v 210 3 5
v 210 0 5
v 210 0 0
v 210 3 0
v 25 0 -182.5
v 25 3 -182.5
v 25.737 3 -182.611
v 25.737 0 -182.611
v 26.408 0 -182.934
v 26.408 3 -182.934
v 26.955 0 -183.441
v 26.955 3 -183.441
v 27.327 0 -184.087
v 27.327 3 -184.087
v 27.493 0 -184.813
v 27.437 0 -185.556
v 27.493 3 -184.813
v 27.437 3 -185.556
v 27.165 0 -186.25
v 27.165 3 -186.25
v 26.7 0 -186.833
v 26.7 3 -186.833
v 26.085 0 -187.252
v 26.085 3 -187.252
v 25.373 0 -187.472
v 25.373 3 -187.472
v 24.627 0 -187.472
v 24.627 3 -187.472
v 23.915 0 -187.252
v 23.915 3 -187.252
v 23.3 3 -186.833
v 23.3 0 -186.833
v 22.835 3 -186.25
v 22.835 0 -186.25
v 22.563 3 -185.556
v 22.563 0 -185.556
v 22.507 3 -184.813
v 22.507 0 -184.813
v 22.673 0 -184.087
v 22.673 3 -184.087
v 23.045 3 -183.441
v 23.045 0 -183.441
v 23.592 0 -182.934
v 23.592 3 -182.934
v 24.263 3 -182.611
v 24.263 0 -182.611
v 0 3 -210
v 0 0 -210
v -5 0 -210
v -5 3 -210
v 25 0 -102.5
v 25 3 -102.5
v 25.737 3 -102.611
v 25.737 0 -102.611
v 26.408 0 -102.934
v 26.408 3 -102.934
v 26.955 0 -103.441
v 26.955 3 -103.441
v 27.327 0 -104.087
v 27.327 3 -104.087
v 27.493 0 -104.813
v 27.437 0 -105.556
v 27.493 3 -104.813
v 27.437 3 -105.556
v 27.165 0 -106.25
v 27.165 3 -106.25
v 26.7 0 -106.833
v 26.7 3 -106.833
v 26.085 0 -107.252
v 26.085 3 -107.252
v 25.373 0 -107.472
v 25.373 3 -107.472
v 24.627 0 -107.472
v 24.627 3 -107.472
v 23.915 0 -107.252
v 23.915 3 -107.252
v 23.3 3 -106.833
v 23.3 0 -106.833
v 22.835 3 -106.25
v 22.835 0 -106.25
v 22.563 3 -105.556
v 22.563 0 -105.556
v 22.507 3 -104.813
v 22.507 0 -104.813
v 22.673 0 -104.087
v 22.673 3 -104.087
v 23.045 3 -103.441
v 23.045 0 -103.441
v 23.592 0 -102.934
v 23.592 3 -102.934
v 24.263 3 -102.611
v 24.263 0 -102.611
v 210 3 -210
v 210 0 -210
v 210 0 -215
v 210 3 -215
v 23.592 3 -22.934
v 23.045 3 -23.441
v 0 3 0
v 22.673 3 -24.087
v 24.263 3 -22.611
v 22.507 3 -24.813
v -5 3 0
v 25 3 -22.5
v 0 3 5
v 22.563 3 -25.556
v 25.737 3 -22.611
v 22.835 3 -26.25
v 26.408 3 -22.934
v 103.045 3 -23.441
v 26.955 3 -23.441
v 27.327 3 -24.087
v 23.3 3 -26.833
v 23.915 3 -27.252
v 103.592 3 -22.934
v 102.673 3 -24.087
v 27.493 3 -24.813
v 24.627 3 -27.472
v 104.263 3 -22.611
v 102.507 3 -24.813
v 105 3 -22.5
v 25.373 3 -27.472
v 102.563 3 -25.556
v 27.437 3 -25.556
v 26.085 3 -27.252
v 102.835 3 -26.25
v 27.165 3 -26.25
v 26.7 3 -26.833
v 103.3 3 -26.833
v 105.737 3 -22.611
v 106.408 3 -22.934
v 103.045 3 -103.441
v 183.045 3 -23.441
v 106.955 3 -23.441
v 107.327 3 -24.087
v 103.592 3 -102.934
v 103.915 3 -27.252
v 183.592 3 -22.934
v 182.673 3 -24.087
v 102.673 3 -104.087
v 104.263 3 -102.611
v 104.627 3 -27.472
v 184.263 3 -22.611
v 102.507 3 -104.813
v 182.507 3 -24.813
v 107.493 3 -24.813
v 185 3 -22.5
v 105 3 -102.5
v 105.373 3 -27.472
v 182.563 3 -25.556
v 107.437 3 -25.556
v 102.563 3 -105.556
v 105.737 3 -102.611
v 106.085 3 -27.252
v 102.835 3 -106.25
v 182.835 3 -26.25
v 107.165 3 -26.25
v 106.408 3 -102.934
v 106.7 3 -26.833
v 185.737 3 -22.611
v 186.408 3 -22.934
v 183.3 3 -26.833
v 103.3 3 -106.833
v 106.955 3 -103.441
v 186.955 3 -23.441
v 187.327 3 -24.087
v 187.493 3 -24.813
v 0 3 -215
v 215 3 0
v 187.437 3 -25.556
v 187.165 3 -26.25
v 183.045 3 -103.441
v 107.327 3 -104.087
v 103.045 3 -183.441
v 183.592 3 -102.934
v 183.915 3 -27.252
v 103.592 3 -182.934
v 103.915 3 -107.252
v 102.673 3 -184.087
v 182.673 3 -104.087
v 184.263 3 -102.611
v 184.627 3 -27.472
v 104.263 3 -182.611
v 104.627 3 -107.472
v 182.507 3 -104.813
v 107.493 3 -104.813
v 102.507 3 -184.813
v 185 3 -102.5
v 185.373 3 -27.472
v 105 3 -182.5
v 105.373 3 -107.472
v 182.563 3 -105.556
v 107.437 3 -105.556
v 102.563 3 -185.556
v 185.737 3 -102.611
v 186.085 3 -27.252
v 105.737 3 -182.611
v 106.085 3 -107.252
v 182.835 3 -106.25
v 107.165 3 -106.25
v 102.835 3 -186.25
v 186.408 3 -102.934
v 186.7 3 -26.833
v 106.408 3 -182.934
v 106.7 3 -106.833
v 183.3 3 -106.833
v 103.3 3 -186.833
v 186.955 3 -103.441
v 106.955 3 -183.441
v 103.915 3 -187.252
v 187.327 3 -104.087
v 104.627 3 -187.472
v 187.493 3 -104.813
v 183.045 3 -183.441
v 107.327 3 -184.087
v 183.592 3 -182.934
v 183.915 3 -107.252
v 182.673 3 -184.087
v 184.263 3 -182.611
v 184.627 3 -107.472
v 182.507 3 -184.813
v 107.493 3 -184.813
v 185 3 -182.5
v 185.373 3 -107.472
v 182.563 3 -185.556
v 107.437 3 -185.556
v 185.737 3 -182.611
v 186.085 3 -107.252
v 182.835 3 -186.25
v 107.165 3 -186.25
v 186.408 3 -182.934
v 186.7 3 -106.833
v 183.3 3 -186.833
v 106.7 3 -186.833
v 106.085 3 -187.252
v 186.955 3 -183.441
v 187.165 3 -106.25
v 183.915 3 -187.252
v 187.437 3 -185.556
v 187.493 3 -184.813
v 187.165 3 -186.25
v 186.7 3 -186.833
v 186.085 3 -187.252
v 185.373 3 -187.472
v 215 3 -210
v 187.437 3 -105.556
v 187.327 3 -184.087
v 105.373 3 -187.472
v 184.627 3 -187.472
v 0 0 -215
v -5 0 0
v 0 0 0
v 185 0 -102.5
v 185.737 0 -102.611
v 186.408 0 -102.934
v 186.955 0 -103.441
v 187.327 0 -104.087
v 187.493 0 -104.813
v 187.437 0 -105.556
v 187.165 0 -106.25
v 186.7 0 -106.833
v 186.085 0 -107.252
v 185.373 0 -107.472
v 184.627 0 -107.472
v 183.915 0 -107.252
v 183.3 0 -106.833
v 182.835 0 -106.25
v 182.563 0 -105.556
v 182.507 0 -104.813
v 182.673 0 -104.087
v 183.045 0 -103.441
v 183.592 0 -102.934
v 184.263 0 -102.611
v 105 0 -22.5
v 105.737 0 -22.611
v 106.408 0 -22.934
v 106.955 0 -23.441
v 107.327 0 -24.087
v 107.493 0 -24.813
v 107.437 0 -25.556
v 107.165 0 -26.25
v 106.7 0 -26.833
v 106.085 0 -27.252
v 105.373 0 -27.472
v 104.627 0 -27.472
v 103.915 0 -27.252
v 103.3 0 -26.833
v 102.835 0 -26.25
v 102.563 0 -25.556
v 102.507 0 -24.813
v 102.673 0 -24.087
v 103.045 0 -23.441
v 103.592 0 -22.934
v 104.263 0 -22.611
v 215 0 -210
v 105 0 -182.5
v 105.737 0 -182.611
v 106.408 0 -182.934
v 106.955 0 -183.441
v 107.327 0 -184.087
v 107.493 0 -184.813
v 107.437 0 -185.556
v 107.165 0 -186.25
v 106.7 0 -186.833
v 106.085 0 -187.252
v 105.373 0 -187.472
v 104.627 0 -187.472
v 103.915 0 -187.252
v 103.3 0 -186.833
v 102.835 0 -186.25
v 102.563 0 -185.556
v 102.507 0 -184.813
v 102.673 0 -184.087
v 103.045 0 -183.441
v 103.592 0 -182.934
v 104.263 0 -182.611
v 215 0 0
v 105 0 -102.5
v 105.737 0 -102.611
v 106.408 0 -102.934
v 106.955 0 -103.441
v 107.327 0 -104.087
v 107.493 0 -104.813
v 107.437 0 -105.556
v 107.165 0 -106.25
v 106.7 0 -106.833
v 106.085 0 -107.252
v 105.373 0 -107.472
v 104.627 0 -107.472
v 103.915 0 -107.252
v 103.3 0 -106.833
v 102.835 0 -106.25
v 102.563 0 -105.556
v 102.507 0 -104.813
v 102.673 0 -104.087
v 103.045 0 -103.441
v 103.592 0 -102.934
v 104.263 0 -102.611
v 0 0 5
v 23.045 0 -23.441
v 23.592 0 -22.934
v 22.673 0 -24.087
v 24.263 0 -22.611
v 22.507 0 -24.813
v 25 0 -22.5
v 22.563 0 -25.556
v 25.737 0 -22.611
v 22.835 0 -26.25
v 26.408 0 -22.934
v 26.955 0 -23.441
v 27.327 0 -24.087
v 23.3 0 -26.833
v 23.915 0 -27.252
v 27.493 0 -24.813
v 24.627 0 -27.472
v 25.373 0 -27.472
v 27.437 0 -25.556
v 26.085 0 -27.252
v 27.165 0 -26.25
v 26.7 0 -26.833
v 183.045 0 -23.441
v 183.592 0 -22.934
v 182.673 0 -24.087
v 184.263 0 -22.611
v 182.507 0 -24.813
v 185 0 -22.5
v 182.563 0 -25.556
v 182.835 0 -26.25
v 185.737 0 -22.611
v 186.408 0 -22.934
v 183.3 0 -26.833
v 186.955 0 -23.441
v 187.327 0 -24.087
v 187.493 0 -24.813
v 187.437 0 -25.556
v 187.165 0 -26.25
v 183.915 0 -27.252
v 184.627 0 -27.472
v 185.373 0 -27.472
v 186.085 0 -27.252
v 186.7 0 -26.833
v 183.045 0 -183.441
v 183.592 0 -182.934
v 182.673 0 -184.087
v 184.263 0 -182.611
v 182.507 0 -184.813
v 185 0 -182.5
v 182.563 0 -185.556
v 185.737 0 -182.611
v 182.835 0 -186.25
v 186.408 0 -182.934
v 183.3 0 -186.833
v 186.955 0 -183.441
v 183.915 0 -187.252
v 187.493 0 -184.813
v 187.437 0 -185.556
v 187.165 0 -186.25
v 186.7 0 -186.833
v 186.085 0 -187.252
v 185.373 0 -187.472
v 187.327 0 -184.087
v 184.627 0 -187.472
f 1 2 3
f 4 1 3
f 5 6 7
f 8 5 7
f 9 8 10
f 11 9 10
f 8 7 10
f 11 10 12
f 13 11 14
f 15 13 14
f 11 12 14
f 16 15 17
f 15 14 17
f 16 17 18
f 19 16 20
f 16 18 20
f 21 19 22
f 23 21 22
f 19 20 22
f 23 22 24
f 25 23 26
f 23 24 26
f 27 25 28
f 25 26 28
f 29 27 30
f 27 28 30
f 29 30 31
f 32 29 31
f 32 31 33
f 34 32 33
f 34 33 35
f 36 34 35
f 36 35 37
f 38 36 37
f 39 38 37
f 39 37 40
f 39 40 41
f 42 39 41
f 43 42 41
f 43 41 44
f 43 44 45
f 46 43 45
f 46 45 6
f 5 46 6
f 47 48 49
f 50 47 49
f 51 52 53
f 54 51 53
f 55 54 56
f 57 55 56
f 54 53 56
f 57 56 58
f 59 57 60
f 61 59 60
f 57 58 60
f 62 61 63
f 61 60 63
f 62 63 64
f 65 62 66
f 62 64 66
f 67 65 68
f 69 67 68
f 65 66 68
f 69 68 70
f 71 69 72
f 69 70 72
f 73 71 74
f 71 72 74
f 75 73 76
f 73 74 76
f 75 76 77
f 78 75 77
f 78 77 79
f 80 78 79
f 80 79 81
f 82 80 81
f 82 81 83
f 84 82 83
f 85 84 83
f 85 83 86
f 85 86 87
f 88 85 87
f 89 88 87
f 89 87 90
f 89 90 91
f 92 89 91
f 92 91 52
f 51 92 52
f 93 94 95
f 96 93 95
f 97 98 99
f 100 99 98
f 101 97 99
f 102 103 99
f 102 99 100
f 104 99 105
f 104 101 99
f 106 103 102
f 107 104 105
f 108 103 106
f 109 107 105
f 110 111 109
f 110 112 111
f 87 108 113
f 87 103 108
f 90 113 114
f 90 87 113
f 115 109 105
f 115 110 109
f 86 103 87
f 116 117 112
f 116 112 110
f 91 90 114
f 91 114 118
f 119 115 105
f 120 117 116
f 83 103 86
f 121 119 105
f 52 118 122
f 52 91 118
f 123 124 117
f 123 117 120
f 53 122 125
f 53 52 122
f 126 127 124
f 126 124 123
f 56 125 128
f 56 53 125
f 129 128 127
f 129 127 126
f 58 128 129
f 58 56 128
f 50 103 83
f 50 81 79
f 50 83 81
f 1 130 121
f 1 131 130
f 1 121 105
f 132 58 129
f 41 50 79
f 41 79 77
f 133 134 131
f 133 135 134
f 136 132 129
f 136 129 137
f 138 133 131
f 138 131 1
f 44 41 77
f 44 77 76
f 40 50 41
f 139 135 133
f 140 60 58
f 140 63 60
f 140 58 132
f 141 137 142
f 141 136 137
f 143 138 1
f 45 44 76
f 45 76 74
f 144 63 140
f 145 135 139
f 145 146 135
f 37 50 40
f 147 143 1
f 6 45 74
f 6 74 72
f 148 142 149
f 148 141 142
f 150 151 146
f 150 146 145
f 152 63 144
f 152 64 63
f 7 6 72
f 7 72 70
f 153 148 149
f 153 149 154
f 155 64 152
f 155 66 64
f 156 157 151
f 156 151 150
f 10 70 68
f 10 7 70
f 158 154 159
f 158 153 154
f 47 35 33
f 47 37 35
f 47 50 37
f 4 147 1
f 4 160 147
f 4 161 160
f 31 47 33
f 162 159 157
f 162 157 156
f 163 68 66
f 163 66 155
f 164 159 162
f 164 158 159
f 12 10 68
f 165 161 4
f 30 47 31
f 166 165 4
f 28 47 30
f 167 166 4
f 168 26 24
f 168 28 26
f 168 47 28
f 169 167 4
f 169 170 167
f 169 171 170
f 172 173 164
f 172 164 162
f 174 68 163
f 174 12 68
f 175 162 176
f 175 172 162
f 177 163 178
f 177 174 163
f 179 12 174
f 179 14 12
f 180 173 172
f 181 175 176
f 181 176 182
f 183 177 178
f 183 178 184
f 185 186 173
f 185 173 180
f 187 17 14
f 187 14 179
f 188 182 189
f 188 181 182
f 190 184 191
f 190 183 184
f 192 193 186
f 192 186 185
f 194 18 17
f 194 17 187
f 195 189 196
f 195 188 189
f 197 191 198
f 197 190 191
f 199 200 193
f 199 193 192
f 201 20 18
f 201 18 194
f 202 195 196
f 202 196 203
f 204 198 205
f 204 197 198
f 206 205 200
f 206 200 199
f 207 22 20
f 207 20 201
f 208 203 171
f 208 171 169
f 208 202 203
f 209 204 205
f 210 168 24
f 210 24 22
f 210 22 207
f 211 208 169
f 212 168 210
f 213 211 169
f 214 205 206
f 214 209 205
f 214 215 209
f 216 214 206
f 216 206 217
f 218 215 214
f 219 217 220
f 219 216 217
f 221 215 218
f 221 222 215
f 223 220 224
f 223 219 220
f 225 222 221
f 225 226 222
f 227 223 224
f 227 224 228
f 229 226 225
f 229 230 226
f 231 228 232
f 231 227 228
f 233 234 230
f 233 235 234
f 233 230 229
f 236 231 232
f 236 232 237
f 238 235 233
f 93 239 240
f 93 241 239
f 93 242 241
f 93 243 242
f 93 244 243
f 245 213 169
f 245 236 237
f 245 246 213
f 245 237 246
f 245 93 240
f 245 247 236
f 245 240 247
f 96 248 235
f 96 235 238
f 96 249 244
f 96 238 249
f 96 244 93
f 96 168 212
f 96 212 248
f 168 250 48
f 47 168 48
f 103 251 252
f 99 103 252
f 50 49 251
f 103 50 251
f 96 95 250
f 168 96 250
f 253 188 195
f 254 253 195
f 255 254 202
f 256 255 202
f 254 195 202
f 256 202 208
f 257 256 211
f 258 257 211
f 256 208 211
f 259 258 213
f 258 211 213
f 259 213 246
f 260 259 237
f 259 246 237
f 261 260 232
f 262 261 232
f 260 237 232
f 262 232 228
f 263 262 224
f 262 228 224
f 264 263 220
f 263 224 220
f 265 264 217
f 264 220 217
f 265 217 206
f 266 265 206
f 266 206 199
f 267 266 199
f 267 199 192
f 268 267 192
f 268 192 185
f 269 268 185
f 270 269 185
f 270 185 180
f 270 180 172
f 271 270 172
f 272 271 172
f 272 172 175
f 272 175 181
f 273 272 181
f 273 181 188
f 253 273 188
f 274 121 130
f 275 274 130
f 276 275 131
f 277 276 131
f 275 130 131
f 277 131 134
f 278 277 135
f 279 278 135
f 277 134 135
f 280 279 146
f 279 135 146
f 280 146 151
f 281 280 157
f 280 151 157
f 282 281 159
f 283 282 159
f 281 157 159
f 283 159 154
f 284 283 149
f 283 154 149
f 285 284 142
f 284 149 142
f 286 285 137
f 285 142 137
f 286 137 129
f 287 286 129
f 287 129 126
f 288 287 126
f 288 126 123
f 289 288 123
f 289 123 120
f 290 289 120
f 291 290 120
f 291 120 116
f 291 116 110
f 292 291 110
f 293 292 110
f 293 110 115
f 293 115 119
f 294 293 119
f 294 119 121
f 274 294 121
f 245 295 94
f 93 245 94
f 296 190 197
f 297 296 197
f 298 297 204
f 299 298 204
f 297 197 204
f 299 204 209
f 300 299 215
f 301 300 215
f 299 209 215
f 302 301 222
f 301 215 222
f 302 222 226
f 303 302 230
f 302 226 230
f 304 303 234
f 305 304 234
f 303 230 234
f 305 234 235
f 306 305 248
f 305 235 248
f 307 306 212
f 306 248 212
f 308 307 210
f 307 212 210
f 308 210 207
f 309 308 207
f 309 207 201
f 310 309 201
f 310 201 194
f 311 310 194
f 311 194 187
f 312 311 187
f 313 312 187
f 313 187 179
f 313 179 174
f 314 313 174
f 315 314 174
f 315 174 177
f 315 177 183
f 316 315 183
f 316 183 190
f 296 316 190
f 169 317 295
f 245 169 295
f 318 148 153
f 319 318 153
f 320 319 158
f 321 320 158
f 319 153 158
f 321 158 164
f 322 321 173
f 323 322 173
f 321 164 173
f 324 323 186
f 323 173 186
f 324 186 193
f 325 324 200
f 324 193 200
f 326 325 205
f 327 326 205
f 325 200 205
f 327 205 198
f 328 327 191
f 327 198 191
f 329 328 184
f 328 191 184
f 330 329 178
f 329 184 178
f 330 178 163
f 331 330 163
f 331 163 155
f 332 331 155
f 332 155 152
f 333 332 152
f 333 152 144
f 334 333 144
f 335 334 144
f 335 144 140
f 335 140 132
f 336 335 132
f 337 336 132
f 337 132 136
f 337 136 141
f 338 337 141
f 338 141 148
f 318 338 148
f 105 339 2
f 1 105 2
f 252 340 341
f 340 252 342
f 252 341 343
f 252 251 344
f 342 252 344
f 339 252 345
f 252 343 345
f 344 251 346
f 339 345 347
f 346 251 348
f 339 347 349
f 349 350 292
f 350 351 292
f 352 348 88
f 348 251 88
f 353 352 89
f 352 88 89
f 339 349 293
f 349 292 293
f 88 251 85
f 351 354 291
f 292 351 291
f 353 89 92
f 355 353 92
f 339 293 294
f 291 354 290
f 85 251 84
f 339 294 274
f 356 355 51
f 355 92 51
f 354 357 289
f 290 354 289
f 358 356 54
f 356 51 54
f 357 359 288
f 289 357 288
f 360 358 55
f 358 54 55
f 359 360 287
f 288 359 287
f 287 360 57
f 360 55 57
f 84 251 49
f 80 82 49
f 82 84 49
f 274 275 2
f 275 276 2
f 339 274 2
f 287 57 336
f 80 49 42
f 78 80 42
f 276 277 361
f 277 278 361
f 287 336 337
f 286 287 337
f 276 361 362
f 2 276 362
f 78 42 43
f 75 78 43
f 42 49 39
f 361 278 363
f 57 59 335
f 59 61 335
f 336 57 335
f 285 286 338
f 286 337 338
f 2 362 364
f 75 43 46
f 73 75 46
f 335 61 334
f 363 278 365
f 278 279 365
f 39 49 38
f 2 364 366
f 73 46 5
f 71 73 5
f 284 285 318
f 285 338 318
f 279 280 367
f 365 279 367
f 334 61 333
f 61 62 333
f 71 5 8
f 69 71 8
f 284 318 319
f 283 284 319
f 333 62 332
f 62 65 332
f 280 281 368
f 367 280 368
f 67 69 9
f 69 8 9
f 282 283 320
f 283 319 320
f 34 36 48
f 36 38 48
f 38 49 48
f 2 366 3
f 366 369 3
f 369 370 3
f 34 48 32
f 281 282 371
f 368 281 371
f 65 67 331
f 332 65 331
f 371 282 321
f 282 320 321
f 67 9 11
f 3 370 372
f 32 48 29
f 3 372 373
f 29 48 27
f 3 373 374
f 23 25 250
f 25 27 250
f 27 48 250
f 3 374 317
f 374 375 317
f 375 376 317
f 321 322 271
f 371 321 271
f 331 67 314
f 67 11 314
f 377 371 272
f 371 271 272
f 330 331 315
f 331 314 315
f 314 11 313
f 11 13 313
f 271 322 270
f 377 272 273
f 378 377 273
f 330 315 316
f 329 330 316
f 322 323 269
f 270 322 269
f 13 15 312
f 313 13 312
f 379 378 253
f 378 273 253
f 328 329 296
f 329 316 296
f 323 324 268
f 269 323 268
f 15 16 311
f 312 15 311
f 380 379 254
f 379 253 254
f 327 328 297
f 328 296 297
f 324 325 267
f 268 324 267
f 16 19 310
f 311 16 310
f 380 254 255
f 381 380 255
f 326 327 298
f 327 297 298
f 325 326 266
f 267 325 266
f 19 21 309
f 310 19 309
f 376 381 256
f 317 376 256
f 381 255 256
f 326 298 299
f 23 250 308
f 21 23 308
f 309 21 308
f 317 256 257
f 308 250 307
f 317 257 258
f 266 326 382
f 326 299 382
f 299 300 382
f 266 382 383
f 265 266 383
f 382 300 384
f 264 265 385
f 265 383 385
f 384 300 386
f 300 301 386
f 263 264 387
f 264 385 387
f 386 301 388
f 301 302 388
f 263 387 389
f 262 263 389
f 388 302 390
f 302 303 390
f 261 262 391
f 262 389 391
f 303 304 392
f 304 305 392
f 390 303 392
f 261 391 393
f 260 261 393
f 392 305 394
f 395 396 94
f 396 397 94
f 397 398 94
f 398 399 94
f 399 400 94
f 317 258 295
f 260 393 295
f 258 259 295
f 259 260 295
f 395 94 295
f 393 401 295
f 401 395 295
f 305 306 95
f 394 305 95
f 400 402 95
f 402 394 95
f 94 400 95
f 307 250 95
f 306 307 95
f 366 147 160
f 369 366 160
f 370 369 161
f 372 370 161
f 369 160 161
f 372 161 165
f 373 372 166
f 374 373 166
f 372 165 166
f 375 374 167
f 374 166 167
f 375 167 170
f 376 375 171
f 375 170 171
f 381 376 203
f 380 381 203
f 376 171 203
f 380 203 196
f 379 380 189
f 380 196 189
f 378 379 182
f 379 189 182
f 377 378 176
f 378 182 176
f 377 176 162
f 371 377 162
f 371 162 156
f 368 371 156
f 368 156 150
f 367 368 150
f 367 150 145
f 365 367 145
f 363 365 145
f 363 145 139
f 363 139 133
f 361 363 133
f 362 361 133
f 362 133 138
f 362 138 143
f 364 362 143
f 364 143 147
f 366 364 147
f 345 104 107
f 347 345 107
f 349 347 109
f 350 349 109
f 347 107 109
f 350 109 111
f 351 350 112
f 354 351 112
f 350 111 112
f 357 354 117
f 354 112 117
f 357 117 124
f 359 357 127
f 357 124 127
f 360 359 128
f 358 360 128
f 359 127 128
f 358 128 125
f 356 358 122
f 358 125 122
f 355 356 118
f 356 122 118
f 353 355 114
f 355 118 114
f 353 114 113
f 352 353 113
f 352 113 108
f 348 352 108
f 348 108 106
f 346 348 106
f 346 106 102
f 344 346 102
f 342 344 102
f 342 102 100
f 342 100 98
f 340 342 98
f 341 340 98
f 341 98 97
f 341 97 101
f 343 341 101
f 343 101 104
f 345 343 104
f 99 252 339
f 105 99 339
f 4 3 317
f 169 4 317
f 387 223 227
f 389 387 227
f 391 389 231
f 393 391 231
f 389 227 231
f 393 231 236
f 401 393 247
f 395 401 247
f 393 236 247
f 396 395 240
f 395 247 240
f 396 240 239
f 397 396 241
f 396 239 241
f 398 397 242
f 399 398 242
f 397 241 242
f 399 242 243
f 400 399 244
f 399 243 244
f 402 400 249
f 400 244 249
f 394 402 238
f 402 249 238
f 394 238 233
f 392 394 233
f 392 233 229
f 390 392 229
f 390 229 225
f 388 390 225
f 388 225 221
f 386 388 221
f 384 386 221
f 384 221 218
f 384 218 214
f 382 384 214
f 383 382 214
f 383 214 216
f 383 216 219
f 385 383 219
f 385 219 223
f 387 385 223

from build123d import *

# Parameters (mm, degrees)
BOSS_EXTRUDE1_DEPTH  = 3
SKETCH2_R            = 2.5
CUT_EXTRUDE1_DEPTH   = 305.070715459
LPATTERN1_COUNT      = 3
LPATTERN1_PITCH      = 80
LPATTERN1_COUNT_DIR2 = 3
LPATTERN1_PITCH_DIR2 = 80


with BuildPart() as part:
    # Sketch1 → Boss-Extrude1 (new body)
    with BuildSketch(Plane(origin=(0, 0, 0), x_dir=(1, 0, 0), z_dir=(0, 1, 0))):
        Polygon((0, -5), (210, -5), (210, 0), (215, 0), (215, 210), (210, 210), (210, 215), (0, 215), (0, 210), (-5, 210), (-5, 0), (0, 0), align=None)
    extrude(amount=BOSS_EXTRUDE1_DEPTH)

    # Sketch2 → Cut-Extrude1 (cut, through all)
    with BuildSketch(Plane(origin=(0, 3, 0), x_dir=(1, 0, 0), z_dir=(0, 1, 0))):
        with Locations(Location((25, 25, 0), (0, 0, 270))):
            Circle(SKETCH2_R)
    cut_extrude1 = extrude(amount=-CUT_EXTRUDE1_DEPTH, mode=Mode.SUBTRACT)

    # LPattern1: Cut-Extrude1 3 × 3
    with Locations(*[(i * LPATTERN1_PITCH, 0, -j * LPATTERN1_PITCH_DIR2) for i in range(LPATTERN1_COUNT) for j in range(LPATTERN1_COUNT_DIR2) if (i, j) != (0, 0)]):
        add(cut_extrude1, mode=Mode.SUBTRACT)


solid = part.part
